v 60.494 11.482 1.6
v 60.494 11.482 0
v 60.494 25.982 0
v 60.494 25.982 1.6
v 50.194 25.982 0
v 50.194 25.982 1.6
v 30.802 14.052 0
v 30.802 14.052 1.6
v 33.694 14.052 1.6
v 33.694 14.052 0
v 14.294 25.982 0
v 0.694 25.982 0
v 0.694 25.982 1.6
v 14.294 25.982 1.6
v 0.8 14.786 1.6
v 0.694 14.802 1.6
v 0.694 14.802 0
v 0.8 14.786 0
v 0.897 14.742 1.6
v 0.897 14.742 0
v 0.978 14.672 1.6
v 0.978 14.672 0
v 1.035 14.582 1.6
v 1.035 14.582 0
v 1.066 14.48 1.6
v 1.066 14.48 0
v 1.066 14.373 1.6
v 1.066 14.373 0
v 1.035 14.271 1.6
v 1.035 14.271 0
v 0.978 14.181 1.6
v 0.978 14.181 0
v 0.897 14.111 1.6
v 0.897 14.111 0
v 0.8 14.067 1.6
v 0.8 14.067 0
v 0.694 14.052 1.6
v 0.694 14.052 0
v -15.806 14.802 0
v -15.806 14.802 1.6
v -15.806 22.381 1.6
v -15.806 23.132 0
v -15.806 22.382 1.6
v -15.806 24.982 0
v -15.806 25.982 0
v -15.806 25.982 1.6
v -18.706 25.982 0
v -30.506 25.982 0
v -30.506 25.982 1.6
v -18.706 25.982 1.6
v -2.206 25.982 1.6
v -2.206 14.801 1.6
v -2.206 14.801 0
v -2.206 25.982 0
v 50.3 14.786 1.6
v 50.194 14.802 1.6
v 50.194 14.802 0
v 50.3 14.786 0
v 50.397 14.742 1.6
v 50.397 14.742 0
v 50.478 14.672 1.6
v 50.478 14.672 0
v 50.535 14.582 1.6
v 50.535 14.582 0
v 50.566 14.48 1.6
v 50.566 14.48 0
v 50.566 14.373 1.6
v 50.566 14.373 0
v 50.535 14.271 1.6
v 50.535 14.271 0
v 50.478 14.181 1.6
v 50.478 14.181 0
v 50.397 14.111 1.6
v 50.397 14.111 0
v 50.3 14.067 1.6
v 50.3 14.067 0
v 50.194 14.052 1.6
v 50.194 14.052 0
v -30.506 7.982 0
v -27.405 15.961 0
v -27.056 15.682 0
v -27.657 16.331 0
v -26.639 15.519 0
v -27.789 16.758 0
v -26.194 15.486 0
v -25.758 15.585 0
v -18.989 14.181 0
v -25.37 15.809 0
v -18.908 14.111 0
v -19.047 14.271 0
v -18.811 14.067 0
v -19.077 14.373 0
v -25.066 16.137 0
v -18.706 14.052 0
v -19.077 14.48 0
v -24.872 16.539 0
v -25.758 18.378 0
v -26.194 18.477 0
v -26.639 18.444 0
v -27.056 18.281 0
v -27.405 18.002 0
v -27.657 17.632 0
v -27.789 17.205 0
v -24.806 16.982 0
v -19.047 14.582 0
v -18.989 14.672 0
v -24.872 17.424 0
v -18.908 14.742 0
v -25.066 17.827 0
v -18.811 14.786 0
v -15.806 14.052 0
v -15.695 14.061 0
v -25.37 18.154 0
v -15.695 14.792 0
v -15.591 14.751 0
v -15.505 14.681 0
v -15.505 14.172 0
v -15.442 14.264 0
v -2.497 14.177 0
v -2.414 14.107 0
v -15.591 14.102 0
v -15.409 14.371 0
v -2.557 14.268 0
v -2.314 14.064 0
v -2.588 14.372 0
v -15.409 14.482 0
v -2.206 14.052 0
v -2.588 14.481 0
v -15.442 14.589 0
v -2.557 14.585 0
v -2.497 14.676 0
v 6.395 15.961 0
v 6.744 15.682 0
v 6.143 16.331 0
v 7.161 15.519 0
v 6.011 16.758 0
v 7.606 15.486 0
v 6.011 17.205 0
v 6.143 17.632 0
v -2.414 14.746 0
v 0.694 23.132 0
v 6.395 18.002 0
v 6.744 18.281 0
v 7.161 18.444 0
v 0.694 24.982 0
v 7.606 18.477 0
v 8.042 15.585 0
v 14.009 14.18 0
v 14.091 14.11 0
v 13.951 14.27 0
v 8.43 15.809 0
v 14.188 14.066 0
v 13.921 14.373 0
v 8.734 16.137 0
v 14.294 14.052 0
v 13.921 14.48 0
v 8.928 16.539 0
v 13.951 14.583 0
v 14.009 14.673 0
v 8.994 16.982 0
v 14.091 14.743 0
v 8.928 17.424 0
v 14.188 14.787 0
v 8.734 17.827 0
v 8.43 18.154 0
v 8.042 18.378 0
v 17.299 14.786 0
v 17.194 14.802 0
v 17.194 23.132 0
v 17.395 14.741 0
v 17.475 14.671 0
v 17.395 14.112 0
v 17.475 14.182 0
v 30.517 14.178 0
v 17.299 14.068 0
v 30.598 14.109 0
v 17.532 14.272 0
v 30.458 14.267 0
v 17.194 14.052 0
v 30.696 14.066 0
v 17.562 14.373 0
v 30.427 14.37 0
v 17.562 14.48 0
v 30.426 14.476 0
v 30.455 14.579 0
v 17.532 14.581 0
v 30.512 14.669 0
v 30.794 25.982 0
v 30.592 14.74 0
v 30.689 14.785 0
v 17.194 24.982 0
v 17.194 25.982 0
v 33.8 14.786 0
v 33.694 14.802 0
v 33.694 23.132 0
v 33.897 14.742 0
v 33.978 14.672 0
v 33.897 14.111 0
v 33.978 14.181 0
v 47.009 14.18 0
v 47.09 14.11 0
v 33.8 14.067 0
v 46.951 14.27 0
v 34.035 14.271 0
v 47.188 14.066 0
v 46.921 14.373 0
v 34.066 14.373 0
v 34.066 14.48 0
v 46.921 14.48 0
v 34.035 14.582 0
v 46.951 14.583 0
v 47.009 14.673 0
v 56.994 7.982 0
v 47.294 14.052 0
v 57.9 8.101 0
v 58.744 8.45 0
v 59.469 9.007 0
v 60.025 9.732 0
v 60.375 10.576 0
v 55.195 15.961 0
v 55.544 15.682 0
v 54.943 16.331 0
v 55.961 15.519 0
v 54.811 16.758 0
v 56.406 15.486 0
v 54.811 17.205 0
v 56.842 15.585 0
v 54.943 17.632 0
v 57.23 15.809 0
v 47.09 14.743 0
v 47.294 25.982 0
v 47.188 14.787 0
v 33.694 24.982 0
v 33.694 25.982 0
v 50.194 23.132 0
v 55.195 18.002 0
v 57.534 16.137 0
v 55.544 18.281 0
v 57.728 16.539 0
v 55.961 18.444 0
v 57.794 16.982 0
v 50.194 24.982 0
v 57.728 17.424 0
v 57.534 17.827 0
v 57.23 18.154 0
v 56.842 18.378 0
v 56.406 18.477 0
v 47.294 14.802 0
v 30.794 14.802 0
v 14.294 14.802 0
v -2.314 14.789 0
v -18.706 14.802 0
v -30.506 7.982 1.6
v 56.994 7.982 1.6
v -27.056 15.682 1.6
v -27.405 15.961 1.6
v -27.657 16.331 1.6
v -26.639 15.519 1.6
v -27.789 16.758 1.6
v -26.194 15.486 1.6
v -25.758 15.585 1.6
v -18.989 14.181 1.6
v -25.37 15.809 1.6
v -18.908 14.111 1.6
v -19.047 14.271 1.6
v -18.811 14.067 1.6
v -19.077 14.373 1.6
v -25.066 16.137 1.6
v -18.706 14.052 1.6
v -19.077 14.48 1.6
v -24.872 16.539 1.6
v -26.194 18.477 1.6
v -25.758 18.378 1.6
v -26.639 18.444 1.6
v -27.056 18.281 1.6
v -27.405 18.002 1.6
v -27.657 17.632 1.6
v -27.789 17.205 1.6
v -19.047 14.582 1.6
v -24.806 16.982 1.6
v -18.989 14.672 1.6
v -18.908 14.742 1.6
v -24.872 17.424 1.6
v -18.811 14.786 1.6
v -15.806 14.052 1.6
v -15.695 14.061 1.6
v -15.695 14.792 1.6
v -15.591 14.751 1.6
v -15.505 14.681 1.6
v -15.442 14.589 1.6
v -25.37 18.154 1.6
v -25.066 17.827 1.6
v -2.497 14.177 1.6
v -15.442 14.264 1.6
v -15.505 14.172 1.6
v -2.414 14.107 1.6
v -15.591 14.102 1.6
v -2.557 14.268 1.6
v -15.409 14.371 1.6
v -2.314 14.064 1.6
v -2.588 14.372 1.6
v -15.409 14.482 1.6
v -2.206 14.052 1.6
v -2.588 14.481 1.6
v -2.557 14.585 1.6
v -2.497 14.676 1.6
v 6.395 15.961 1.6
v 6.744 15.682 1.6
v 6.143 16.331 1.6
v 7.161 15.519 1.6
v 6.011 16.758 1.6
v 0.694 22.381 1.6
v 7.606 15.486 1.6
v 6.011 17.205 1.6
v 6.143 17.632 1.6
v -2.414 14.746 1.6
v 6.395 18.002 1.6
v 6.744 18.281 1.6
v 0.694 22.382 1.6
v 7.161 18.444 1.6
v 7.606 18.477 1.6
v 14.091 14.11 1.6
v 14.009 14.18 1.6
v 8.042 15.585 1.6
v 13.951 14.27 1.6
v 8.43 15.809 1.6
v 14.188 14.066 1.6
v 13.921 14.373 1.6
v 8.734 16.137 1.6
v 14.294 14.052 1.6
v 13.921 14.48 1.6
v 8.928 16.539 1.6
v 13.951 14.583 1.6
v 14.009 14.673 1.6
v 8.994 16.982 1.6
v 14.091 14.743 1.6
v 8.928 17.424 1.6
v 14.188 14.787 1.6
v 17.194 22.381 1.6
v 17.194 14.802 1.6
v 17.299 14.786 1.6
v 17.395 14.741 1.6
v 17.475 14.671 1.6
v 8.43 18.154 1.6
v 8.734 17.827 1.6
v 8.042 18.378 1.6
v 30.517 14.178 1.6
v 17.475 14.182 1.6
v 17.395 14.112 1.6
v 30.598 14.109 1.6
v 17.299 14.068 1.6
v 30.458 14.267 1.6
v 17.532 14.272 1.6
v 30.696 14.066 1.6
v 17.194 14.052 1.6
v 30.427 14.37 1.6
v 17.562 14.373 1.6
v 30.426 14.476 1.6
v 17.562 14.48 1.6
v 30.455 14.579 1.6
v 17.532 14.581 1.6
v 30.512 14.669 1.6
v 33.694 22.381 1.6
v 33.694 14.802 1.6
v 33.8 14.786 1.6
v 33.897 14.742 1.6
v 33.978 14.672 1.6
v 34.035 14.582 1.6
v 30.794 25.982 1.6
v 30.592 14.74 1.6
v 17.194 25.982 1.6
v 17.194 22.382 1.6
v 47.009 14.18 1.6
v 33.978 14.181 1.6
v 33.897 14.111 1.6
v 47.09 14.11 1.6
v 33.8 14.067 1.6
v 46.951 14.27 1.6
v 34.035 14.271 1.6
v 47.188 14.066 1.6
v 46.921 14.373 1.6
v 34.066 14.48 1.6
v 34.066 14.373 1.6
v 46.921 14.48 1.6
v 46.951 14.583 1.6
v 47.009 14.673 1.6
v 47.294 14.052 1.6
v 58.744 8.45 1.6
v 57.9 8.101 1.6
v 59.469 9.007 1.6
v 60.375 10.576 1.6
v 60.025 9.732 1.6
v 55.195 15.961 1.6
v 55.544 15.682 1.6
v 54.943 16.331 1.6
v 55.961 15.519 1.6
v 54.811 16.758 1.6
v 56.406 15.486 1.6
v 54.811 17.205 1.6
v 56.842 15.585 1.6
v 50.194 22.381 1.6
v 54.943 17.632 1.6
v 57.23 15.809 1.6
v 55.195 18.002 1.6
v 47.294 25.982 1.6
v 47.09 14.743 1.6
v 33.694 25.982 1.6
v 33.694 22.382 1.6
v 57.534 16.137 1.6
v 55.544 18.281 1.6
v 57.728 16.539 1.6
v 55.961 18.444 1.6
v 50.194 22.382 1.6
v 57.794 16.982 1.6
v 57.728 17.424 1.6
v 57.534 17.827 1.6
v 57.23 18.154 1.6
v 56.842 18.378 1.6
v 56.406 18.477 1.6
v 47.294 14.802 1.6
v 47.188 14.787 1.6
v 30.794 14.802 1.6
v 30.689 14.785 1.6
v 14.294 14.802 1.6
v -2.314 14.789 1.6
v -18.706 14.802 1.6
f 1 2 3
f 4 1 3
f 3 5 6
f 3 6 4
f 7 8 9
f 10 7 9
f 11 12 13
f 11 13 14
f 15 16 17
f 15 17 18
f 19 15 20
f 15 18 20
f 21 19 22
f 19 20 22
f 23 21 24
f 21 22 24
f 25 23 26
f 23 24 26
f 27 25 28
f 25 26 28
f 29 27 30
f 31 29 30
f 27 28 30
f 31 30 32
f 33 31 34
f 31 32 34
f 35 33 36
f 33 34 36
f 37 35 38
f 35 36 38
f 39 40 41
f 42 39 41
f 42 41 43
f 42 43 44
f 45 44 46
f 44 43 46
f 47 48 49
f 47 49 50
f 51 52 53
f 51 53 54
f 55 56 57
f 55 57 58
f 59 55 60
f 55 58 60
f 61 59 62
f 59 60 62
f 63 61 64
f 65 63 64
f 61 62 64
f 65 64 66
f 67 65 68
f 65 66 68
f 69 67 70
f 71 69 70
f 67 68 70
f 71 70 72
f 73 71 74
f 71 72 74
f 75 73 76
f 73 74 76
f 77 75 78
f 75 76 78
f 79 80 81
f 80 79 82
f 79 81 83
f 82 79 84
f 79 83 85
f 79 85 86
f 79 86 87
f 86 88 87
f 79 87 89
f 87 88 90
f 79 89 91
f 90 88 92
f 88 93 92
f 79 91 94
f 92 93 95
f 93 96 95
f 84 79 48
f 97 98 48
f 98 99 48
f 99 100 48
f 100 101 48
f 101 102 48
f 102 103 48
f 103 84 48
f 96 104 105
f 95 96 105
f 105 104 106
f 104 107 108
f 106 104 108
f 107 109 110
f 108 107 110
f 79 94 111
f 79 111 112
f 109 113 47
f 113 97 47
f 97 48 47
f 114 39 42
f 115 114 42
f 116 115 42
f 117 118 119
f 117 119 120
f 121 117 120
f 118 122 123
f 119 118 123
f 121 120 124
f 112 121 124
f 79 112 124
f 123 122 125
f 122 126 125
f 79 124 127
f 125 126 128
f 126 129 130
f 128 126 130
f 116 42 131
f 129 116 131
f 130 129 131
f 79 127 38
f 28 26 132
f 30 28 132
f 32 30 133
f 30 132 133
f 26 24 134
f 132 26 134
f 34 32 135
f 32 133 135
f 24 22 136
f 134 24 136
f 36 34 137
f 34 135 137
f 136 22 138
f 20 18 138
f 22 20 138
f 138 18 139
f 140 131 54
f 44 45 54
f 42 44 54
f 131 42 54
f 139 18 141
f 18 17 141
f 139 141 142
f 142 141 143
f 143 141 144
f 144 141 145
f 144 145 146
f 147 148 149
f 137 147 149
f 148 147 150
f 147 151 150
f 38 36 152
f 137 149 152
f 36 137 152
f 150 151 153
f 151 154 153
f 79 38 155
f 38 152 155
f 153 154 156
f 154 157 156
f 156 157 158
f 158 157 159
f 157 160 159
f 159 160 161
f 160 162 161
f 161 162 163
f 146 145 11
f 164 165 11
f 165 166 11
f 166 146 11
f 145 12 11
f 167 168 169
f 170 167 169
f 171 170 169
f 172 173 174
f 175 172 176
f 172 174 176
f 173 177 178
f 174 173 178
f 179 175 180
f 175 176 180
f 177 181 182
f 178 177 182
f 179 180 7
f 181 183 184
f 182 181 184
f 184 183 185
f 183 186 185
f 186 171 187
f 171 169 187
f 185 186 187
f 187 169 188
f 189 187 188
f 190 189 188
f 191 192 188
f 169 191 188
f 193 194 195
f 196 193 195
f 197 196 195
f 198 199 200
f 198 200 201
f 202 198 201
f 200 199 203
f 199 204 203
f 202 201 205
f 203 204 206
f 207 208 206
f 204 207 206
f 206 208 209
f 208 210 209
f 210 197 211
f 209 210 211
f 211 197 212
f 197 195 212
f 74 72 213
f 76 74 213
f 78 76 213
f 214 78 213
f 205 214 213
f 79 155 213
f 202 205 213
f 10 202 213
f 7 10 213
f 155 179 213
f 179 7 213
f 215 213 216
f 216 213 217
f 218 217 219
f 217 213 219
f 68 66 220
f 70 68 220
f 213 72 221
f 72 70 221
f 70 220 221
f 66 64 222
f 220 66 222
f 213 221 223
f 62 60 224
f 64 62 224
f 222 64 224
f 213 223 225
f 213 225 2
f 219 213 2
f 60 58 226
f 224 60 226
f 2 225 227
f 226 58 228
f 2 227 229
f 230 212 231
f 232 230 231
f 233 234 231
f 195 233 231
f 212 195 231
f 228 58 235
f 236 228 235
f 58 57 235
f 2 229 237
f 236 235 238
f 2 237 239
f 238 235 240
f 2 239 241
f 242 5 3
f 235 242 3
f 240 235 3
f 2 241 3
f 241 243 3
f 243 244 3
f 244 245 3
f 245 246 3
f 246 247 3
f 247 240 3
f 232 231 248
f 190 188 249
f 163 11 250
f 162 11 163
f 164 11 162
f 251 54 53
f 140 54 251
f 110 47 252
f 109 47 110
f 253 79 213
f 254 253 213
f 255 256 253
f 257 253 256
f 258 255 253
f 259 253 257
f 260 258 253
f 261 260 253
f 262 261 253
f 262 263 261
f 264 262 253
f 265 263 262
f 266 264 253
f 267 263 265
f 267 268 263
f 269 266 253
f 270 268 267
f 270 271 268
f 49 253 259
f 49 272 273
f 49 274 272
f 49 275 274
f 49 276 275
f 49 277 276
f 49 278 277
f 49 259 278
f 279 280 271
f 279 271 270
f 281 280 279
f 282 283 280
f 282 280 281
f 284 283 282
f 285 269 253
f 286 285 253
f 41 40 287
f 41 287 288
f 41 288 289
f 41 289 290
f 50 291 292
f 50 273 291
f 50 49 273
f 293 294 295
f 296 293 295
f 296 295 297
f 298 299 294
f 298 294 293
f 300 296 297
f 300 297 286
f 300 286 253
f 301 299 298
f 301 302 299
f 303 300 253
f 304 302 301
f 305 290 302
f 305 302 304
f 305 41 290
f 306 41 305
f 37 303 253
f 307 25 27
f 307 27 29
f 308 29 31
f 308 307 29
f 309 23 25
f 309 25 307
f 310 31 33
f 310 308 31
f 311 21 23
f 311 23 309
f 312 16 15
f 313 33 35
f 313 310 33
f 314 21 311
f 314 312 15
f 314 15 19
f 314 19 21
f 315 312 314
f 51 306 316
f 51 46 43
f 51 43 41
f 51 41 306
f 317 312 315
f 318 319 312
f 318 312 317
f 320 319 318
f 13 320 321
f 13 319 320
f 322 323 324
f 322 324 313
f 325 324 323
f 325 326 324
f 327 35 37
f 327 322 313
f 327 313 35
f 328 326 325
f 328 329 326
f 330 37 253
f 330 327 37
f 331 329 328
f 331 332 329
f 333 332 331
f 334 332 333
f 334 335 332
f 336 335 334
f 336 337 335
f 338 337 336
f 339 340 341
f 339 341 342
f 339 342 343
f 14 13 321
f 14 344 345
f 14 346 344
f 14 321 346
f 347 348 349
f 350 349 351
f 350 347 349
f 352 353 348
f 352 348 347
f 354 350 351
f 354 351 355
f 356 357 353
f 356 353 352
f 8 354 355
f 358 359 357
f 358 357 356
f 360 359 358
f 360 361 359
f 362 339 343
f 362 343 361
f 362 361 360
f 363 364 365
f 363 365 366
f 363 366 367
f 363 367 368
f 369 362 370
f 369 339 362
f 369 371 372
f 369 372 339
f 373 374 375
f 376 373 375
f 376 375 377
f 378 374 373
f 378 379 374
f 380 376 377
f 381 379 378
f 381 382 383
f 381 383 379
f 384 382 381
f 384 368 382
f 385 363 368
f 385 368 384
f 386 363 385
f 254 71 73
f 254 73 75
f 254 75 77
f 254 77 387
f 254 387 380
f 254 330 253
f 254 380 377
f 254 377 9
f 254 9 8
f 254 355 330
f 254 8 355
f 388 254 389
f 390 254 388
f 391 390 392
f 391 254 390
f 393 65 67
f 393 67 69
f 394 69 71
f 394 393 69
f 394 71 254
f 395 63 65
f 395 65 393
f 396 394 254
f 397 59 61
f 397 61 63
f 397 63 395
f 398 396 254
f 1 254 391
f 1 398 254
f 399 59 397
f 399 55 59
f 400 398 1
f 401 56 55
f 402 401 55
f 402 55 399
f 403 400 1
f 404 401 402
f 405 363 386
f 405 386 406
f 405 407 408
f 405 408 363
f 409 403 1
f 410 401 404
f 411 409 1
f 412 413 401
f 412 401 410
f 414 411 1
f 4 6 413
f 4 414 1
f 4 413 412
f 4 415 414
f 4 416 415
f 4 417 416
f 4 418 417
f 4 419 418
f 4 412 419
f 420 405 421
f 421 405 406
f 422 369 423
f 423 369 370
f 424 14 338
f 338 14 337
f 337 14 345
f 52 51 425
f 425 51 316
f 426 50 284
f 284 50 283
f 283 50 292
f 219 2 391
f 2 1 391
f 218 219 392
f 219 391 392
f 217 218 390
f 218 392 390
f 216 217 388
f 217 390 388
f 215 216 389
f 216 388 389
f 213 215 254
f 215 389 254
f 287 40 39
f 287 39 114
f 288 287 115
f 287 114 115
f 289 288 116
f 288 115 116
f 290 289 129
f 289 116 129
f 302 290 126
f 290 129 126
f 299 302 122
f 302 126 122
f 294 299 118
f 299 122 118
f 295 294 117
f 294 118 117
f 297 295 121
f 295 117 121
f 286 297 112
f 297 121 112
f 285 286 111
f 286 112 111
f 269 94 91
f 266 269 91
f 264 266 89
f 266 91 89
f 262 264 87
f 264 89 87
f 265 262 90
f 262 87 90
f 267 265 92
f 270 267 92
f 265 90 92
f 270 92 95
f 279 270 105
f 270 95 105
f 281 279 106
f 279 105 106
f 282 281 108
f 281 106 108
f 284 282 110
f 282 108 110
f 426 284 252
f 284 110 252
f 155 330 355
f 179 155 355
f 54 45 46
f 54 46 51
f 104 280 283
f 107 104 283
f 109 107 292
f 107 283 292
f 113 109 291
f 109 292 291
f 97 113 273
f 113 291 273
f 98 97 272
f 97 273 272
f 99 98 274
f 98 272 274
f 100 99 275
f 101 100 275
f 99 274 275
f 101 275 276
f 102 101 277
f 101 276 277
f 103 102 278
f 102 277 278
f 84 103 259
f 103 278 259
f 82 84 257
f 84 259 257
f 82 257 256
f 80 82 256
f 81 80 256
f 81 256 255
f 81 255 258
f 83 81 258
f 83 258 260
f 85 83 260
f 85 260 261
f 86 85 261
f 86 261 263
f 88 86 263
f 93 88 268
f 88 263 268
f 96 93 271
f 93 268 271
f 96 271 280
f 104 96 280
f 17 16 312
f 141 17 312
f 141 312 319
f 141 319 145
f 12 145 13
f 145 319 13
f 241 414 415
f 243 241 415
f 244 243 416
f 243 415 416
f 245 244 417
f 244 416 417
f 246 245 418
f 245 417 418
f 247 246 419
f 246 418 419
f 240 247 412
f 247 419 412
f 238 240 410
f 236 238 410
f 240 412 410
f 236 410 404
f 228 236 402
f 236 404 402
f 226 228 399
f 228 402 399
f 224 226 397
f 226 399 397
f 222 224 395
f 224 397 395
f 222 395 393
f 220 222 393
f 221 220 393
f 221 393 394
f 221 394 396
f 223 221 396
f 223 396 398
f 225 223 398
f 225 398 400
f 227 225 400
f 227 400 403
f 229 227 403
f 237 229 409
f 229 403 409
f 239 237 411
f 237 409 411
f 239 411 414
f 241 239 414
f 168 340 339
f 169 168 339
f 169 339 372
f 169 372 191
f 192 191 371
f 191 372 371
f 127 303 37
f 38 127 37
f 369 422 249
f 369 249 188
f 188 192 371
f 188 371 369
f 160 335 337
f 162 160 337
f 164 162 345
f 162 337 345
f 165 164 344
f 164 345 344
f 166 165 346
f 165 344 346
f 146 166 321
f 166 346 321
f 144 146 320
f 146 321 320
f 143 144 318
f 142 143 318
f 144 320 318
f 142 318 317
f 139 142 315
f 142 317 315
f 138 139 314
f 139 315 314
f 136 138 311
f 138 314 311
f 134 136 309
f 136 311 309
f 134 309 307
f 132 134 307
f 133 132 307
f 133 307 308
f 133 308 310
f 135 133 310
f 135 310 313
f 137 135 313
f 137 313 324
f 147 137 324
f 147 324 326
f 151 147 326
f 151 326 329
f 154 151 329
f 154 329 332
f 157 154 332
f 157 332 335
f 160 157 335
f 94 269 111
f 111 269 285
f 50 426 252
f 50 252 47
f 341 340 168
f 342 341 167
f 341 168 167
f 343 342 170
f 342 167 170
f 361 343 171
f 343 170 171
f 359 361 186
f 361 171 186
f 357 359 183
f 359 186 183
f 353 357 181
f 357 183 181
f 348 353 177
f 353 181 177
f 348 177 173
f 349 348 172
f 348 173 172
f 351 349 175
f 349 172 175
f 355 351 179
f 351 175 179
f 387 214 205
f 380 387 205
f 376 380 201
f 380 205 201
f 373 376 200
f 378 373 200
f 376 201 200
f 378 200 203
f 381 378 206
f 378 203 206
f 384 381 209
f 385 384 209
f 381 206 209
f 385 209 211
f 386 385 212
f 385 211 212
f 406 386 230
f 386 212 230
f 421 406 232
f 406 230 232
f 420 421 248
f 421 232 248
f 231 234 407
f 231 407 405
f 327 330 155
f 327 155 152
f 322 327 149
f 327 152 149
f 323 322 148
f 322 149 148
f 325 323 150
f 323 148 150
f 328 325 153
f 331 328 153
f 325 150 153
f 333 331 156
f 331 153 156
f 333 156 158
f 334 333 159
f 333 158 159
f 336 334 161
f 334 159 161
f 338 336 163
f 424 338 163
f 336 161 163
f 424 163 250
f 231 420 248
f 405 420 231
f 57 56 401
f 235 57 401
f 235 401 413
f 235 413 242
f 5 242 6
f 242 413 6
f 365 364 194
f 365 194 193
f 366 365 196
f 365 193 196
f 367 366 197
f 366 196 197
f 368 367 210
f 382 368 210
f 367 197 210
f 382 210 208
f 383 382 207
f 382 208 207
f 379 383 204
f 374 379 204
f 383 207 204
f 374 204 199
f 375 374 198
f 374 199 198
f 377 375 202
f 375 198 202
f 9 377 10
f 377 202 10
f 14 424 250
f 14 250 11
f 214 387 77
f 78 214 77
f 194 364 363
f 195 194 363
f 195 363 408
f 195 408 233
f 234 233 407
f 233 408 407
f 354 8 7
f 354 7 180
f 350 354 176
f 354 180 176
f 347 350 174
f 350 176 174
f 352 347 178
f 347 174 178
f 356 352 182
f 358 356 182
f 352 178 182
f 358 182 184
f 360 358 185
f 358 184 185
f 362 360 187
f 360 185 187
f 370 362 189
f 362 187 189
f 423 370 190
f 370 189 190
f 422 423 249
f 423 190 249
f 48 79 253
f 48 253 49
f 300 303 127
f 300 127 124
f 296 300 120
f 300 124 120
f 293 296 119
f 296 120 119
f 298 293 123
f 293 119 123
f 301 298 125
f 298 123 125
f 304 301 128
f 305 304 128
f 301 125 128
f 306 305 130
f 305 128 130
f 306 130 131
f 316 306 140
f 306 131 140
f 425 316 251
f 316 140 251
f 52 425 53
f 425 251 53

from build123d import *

# Parameters (mm, degrees)
SZKIC1_W                    = 91
SZKIC1_H                    = 18
DODANIE_WYCI_GNI_CIE1_DEPTH = 1.6
GNIAZDO1_START              = 14.181534091
GNIAZDO1_OUTLINE_W          = 1.6
GNIAZDO1_OUTLINE_H          = 1.6
GNIAZDO1_OUTLINE_W_2        = 2.8
GNIAZDO1_DEPTH              = 8.199061552
GNIAZDO1_START_2            = 23.132472539
GNIAZDO1_2_OUTLINE_W        = 1.6
GNIAZDO1_2_OUTLINE_H        = 1.598549721
GNIAZDO1_2_DEPTH            = 1.849061552
GNIAZDO1_START_3            = 14.151534091
GNIAZDO1_3_OUTLINE_W        = 1.2
GNIAZDO1_3_OUTLINE_H        = 1.6
GNIAZDO1_3_DEPTH            = 8.25
GNIAZDO1_START_4            = 20.480374091
GNIAZDO1_4_OUTLINE_W        = 1.6
GNIAZDO1_4_OUTLINE_H        = 0.001450279
GNIAZDO1_4_DEPTH            = 1.90116
GNIAZDO1_START_5            = -17.405681818
GNIAZDO1_5_DEPTH            = 1.6
GNIAZDO1_START_6            = -0.905681818
GNIAZDO1_6_DEPTH            = 1.6
GNIAZDO1_START_7            = 15.594318182
GNIAZDO1_7_DEPTH            = 1.6
GNIAZDO1_START_8            = 32.094318182
GNIAZDO1_8_DEPTH            = 1.6
GNIAZDO1_START_9            = 48.594318182
GNIAZDO1_9_DEPTH            = 1.6
GNIAZDO2_START              = 14.151534091
GNIAZDO2_OUTLINE_W          = 1.2
GNIAZDO2_OUTLINE_H          = 1.6
GNIAZDO2_DEPTH              = 8.25
SZKIC4_W                    = 2.7
SZKIC4_H                    = 11.83
WYTNIJ_WYCI_GNI_CIE1_DEPTH  = 1.6
ZAOKR_GLENIE1_R             = 3.5
SZKIC5_W                    = 2.9
SZKIC5_H                    = 11.93
WYTNIJ_WYCI_GNI_CIE2_DEPTH  = 1.6
SZKIC6_R                    = 1.5
WYTNIJ_WYCI_GNI_CIE5_DEPTH  = 1.6
SZKIC7_R                    = 1.5
WYTNIJ_WYCI_GNI_CIE4_DEPTH  = 66.857138155
SZKIC8_R                    = 0.375
SZKIC8_R_2                  = 0.375807067
SZKIC8_R_3                  = 0.375017675
SZKIC8_R_4                  = 0.375009396
WYTNIJ_WYCI_GNI_CIE6_DEPTH  = 1.6


with BuildPart() as part:
    # Szkic1 → Dodanie-wyciągnięcie1 (new body)
    with BuildSketch(Plane.XY):
        with Locations((14.994318182, 16.981534091)):
            Rectangle(SZKIC1_W, SZKIC1_H)
    extrude(amount=DODANIE_WYCI_GNI_CIE1_DEPTH)

    # Gniazdo1: read off the stored shape, not the designer's step
    # Gniazdo1 outline → Gniazdo1 (cut)
    with BuildSketch(Plane(origin=(0, 0, 0), x_dir=(1, 0, 0), z_dir=(0, 1, 0)).offset(GNIAZDO1_START)):
        with Locations((-16.605681818, -0.8)):
            Rectangle(GNIAZDO1_OUTLINE_W, GNIAZDO1_OUTLINE_H)
        with Locations((-0.705681818, -0.8)):
            Rectangle(GNIAZDO1_OUTLINE_W_2, GNIAZDO1_OUTLINE_H)
        with Locations((15.794318182, -0.8)):
            Rectangle(GNIAZDO1_OUTLINE_W_2, GNIAZDO1_OUTLINE_H)
        with Locations((32.294318182, -0.8)):
            Rectangle(GNIAZDO1_OUTLINE_W_2, GNIAZDO1_OUTLINE_H)
        with Locations((48.794318182, -0.8)):
            Rectangle(GNIAZDO1_OUTLINE_W_2, GNIAZDO1_OUTLINE_H)
    extrude(amount=GNIAZDO1_DEPTH, mode=Mode.SUBTRACT)

    # Gniazdo1 2 outline → Gniazdo1 2 (cut)
    with BuildSketch(Plane(origin=(0, 0, 0), x_dir=(1, 0, 0), z_dir=(0, 1, 0)).offset(GNIAZDO1_START_2)):
        with Locations((-16.605681818, -0.799274861)):
            Rectangle(GNIAZDO1_2_OUTLINE_W, GNIAZDO1_2_OUTLINE_H)
        with Locations((-0.105681818, -0.799274861)):
            Rectangle(GNIAZDO1_2_OUTLINE_W, GNIAZDO1_2_OUTLINE_H)
        with Locations((16.394318182, -0.799274861)):
            Rectangle(GNIAZDO1_2_OUTLINE_W, GNIAZDO1_2_OUTLINE_H)
        with Locations((32.894318182, -0.799274861)):
            Rectangle(GNIAZDO1_2_OUTLINE_W, GNIAZDO1_2_OUTLINE_H)
        with Locations((49.394318182, -0.799274861)):
            Rectangle(GNIAZDO1_2_OUTLINE_W, GNIAZDO1_2_OUTLINE_H)
    extrude(amount=GNIAZDO1_2_DEPTH, mode=Mode.SUBTRACT)

    # Gniazdo1 3 outline → Gniazdo1 3 (cut)
    with BuildSketch(Plane(origin=(0, 0, 0), x_dir=(1, 0, 0), z_dir=(0, 1, 0)).offset(GNIAZDO1_START_3)):
        with Locations((-1.505681818, -0.8)):
            Rectangle(GNIAZDO1_3_OUTLINE_W, GNIAZDO1_3_OUTLINE_H)
        with Locations((14.994318182, -0.8)):
            Rectangle(GNIAZDO1_3_OUTLINE_W, GNIAZDO1_3_OUTLINE_H)
        with Locations((31.494318182, -0.8)):
            Rectangle(GNIAZDO1_3_OUTLINE_W, GNIAZDO1_3_OUTLINE_H)
        with Locations((47.994318182, -0.8)):
            Rectangle(GNIAZDO1_3_OUTLINE_W, GNIAZDO1_3_OUTLINE_H)
    extrude(amount=GNIAZDO1_3_DEPTH, mode=Mode.SUBTRACT)

    # Gniazdo1 4 outline → Gniazdo1 4 (cut)
    with BuildSketch(Plane(origin=(0, 0, 0), x_dir=(1, 0, 0), z_dir=(0, 1, 0)).offset(GNIAZDO1_START_4)):
        with Locations((-16.605681818, -1.599274861)):
            Rectangle(GNIAZDO1_4_OUTLINE_W, GNIAZDO1_4_OUTLINE_H)
        with Locations((-0.105681818, -1.599274861)):
            Rectangle(GNIAZDO1_4_OUTLINE_W, GNIAZDO1_4_OUTLINE_H)
        with Locations((16.394318182, -1.599274861)):
            Rectangle(GNIAZDO1_4_OUTLINE_W, GNIAZDO1_4_OUTLINE_H)
        with Locations((32.894318182, -1.599274861)):
            Rectangle(GNIAZDO1_4_OUTLINE_W, GNIAZDO1_4_OUTLINE_H)
        with Locations((49.394318182, -1.599274861)):
            Rectangle(GNIAZDO1_4_OUTLINE_W, GNIAZDO1_4_OUTLINE_H)
    extrude(amount=GNIAZDO1_4_DEPTH, mode=Mode.SUBTRACT)

    # Gniazdo1 5 outline → Gniazdo1 5 (cut)
    with BuildSketch(Plane.YZ.offset(GNIAZDO1_START_5)):
        with BuildLine():
            Line((23.132472539, 1.598549721), (23.131534091, 1.598549721))
            ThreePointArc((23.131534091, 1.598549721), (23.132237853, 1.585284765), (23.132472539, 1.572003227))
            Line((23.132472539, 1.572003227), (23.132472539, 1.598549721))
        make_face()
        with BuildLine():
            Line((22.380595643, 1.598549721), (22.380595643, 1.572003227))
            ThreePointArc((22.380595643, 1.572003227), (22.380830329, 1.585284765), (22.381534091, 1.598549721))
            Line((22.381534091, 1.598549721), (22.380595643, 1.598549721))
        make_face()
        with BuildLine():
            Line((23.132472539, 0), (23.132472539, 1.572003227))
            ThreePointArc((23.132472539, 1.572003227), (22.756534091, 1.196064779), (22.380595643, 1.572003227))
            Line((22.380595643, 1.572003227), (22.380595643, 0))
            Line((22.380595643, 0), (23.132472539, 0))
        make_face()
    extrude(amount=GNIAZDO1_5_DEPTH, mode=Mode.SUBTRACT)

    # Gniazdo1 6 outline → Gniazdo1 6 (cut)
    with BuildSketch(Plane.YZ.offset(GNIAZDO1_START_6)):
        with BuildLine():
            Line((23.132472539, 1.598549721), (23.131534091, 1.598549721))
            ThreePointArc((23.131534091, 1.598549721), (23.132237853, 1.585284765), (23.132472539, 1.572003227))
            Line((23.132472539, 1.572003227), (23.132472539, 1.598549721))
        make_face()
        with BuildLine():
            Line((22.380595643, 1.598549721), (22.380595643, 1.572003227))
            ThreePointArc((22.380595643, 1.572003227), (22.380830329, 1.585284765), (22.381534091, 1.598549721))
            Line((22.381534091, 1.598549721), (22.380595643, 1.598549721))
        make_face()
        with BuildLine():
            Line((23.132472539, 0), (23.132472539, 1.572003227))
            ThreePointArc((23.132472539, 1.572003227), (22.756534091, 1.196064779), (22.380595643, 1.572003227))
            Line((22.380595643, 1.572003227), (22.380595643, 0))
            Line((22.380595643, 0), (23.132472539, 0))
        make_face()
    extrude(amount=GNIAZDO1_6_DEPTH, mode=Mode.SUBTRACT)

    # Gniazdo1 7 outline → Gniazdo1 7 (cut)
    with BuildSketch(Plane.YZ.offset(GNIAZDO1_START_7)):
        with BuildLine():
            Line((23.132472539, 1.598549721), (23.131534091, 1.598549721))
            ThreePointArc((23.131534091, 1.598549721), (23.132237853, 1.585284765), (23.132472539, 1.572003227))
            Line((23.132472539, 1.572003227), (23.132472539, 1.598549721))
        make_face()
        with BuildLine():
            Line((22.380595643, 1.598549721), (22.380595643, 1.572003227))
            ThreePointArc((22.380595643, 1.572003227), (22.380830329, 1.585284765), (22.381534091, 1.598549721))
            Line((22.381534091, 1.598549721), (22.380595643, 1.598549721))
        make_face()
        with BuildLine():
            Line((23.132472539, 0), (23.132472539, 1.572003227))
            ThreePointArc((23.132472539, 1.572003227), (22.756534091, 1.196064779), (22.380595643, 1.572003227))
            Line((22.380595643, 1.572003227), (22.380595643, 0))
            Line((22.380595643, 0), (23.132472539, 0))
        make_face()
    extrude(amount=GNIAZDO1_7_DEPTH, mode=Mode.SUBTRACT)

    # Gniazdo1 8 outline → Gniazdo1 8 (cut)
    with BuildSketch(Plane.YZ.offset(GNIAZDO1_START_8)):
        with BuildLine():
            Line((23.132472539, 1.598549721), (23.131534091, 1.598549721))
            ThreePointArc((23.131534091, 1.598549721), (23.132237853, 1.585284765), (23.132472539, 1.572003227))
            Line((23.132472539, 1.572003227), (23.132472539, 1.598549721))
        make_face()
        with BuildLine():
            Line((22.380595643, 1.598549721), (22.380595643, 1.572003227))
            ThreePointArc((22.380595643, 1.572003227), (22.380830329, 1.585284765), (22.381534091, 1.598549721))
            Line((22.381534091, 1.598549721), (22.380595643, 1.598549721))
        make_face()
        with BuildLine():
            Line((23.132472539, 0), (23.132472539, 1.572003227))
            ThreePointArc((23.132472539, 1.572003227), (22.756534091, 1.196064779), (22.380595643, 1.572003227))
            Line((22.380595643, 1.572003227), (22.380595643, 0))
            Line((22.380595643, 0), (23.132472539, 0))
        make_face()
    extrude(amount=GNIAZDO1_8_DEPTH, mode=Mode.SUBTRACT)

    # Gniazdo1 9 outline → Gniazdo1 9 (cut)
    with BuildSketch(Plane.YZ.offset(GNIAZDO1_START_9)):
        with BuildLine():
            Line((23.132472539, 1.598549721), (23.131534091, 1.598549721))
            ThreePointArc((23.131534091, 1.598549721), (23.132237853, 1.585284765), (23.132472539, 1.572003227))
            Line((23.132472539, 1.572003227), (23.132472539, 1.598549721))
        make_face()
        with BuildLine():
            Line((22.380595643, 1.598549721), (22.380595643, 1.572003227))
            ThreePointArc((22.380595643, 1.572003227), (22.380830329, 1.585284765), (22.381534091, 1.598549721))
            Line((22.381534091, 1.598549721), (22.380595643, 1.598549721))
        make_face()
        with BuildLine():
            Line((23.132472539, 0), (23.132472539, 1.572003227))
            ThreePointArc((23.132472539, 1.572003227), (22.756534091, 1.196064779), (22.380595643, 1.572003227))
            Line((22.380595643, 1.572003227), (22.380595643, 0))
            Line((22.380595643, 0), (23.132472539, 0))
        make_face()
    extrude(amount=GNIAZDO1_9_DEPTH, mode=Mode.SUBTRACT)

    # Gniazdo2: read off the stored shape, not the designer's step
    # Gniazdo2 outline → Gniazdo2 (cut)
    with BuildSketch(Plane(origin=(0, 0, 0), x_dir=(1, 0, 0), z_dir=(0, 1, 0)).offset(GNIAZDO2_START)):
        with Locations((-18.005681818, -0.8)):
            Rectangle(GNIAZDO2_OUTLINE_W, GNIAZDO2_OUTLINE_H)
    extrude(amount=GNIAZDO2_DEPTH, mode=Mode.SUBTRACT)

    # Szkic4 → Wytnij-wyciągnięcie1 (cut)
    with BuildSketch(Plane.XY.offset(1.6)):
        with Locations((-17.255681818, 20.066534091)):
            Rectangle(SZKIC4_W, SZKIC4_H)
        with Locations((-0.755681818, 20.066534091)):
            Rectangle(SZKIC4_W, SZKIC4_H)
        with Locations((15.744318182, 20.066534091)):
            Rectangle(SZKIC4_W, SZKIC4_H)
        with Locations((32.244318182, 20.066534091)):
            Rectangle(SZKIC4_W, SZKIC4_H)
        with Locations((48.744318182, 20.066534091)):
            Rectangle(SZKIC4_W, SZKIC4_H)
    extrude(amount=-WYTNIJ_WYCI_GNI_CIE1_DEPTH, mode=Mode.SUBTRACT)

    # Zaokrąglenie1
    zaokr_glenie1_edges = [part.edges().sort_by_distance(p)[0] for p in [
        (60.494318182, 7.981534091, 0.8),
    ]]
    fillet(zaokr_glenie1_edges, radius=ZAOKR_GLENIE1_R)

    # Szkic5 → Wytnij-wyciągnięcie2 (cut)
    with BuildSketch(Plane.XY.offset(1.6)):
        with Locations((48.744318182, 20.016534091)):
            Rectangle(SZKIC5_W, SZKIC5_H)
        with Locations((32.244318182, 20.016534091)):
            Rectangle(SZKIC5_W, SZKIC5_H)
        with Locations((15.744318182, 20.016534091)):
            Rectangle(SZKIC5_W, SZKIC5_H)
        with Locations((-0.755681818, 20.016534091)):
            Rectangle(SZKIC5_W, SZKIC5_H)
        with Locations((-17.255681818, 20.016534091)):
            Rectangle(SZKIC5_W, SZKIC5_H)
    extrude(amount=-WYTNIJ_WYCI_GNI_CIE2_DEPTH, mode=Mode.SUBTRACT)

    # Szkic6 → Wytnij-wyciągnięcie5 (cut)
    with BuildSketch(Plane.XY.offset(1.6)):
        with Locations((56.294318182, 16.981534091)):
            Circle(SZKIC6_R)
        with Locations((-26.305681818, 16.981534091)):
            Circle(SZKIC6_R)
    extrude(amount=-WYTNIJ_WYCI_GNI_CIE5_DEPTH, mode=Mode.SUBTRACT)

    # Szkic7 → Wytnij-wyciągnięcie4 (cut, through all)
    with BuildSketch(Plane.XY.offset(1.6)):
        with Locations((7.494318182, 16.981534091)):
            Circle(SZKIC7_R)
    extrude(amount=-WYTNIJ_WYCI_GNI_CIE4_DEPTH, mode=Mode.SUBTRACT)

    # Szkic8 → Wytnij-wyciągnięcie6 (cut)
    with BuildSketch(Plane(origin=(0, 0, 0), x_dir=(-1, 0, 0), z_dir=(0, 0, -1))):
        with Locations((18.705681818, 14.426534091)):
            Circle(SZKIC8_R)
        with Locations((15.781065738, 14.426534091)):
            Circle(SZKIC8_R_2)
        with Locations((2.217363992, 14.426534091)):
            Circle(SZKIC8_R)
        with Locations((-0.694318182, 14.426534091)):
            Circle(SZKIC8_R)
        with Locations((-14.292270167, 14.426534091)):
            Circle(SZKIC8_R)
        with Locations((-17.190750174, 14.426534091)):
            Circle(SZKIC8_R)
        with Locations((-30.797959124, 14.426534091)):
            Circle(SZKIC8_R_3)
        with Locations((-33.694318182, 14.426534091)):
            Circle(SZKIC8_R)
        with Locations((-47.291663502, 14.426534091)):
            Circle(SZKIC8_R_4)
        with Locations((-50.194318182, 14.426534091)):
            Circle(SZKIC8_R)
    extrude(amount=-WYTNIJ_WYCI_GNI_CIE6_DEPTH, mode=Mode.SUBTRACT)


solid = part.part
